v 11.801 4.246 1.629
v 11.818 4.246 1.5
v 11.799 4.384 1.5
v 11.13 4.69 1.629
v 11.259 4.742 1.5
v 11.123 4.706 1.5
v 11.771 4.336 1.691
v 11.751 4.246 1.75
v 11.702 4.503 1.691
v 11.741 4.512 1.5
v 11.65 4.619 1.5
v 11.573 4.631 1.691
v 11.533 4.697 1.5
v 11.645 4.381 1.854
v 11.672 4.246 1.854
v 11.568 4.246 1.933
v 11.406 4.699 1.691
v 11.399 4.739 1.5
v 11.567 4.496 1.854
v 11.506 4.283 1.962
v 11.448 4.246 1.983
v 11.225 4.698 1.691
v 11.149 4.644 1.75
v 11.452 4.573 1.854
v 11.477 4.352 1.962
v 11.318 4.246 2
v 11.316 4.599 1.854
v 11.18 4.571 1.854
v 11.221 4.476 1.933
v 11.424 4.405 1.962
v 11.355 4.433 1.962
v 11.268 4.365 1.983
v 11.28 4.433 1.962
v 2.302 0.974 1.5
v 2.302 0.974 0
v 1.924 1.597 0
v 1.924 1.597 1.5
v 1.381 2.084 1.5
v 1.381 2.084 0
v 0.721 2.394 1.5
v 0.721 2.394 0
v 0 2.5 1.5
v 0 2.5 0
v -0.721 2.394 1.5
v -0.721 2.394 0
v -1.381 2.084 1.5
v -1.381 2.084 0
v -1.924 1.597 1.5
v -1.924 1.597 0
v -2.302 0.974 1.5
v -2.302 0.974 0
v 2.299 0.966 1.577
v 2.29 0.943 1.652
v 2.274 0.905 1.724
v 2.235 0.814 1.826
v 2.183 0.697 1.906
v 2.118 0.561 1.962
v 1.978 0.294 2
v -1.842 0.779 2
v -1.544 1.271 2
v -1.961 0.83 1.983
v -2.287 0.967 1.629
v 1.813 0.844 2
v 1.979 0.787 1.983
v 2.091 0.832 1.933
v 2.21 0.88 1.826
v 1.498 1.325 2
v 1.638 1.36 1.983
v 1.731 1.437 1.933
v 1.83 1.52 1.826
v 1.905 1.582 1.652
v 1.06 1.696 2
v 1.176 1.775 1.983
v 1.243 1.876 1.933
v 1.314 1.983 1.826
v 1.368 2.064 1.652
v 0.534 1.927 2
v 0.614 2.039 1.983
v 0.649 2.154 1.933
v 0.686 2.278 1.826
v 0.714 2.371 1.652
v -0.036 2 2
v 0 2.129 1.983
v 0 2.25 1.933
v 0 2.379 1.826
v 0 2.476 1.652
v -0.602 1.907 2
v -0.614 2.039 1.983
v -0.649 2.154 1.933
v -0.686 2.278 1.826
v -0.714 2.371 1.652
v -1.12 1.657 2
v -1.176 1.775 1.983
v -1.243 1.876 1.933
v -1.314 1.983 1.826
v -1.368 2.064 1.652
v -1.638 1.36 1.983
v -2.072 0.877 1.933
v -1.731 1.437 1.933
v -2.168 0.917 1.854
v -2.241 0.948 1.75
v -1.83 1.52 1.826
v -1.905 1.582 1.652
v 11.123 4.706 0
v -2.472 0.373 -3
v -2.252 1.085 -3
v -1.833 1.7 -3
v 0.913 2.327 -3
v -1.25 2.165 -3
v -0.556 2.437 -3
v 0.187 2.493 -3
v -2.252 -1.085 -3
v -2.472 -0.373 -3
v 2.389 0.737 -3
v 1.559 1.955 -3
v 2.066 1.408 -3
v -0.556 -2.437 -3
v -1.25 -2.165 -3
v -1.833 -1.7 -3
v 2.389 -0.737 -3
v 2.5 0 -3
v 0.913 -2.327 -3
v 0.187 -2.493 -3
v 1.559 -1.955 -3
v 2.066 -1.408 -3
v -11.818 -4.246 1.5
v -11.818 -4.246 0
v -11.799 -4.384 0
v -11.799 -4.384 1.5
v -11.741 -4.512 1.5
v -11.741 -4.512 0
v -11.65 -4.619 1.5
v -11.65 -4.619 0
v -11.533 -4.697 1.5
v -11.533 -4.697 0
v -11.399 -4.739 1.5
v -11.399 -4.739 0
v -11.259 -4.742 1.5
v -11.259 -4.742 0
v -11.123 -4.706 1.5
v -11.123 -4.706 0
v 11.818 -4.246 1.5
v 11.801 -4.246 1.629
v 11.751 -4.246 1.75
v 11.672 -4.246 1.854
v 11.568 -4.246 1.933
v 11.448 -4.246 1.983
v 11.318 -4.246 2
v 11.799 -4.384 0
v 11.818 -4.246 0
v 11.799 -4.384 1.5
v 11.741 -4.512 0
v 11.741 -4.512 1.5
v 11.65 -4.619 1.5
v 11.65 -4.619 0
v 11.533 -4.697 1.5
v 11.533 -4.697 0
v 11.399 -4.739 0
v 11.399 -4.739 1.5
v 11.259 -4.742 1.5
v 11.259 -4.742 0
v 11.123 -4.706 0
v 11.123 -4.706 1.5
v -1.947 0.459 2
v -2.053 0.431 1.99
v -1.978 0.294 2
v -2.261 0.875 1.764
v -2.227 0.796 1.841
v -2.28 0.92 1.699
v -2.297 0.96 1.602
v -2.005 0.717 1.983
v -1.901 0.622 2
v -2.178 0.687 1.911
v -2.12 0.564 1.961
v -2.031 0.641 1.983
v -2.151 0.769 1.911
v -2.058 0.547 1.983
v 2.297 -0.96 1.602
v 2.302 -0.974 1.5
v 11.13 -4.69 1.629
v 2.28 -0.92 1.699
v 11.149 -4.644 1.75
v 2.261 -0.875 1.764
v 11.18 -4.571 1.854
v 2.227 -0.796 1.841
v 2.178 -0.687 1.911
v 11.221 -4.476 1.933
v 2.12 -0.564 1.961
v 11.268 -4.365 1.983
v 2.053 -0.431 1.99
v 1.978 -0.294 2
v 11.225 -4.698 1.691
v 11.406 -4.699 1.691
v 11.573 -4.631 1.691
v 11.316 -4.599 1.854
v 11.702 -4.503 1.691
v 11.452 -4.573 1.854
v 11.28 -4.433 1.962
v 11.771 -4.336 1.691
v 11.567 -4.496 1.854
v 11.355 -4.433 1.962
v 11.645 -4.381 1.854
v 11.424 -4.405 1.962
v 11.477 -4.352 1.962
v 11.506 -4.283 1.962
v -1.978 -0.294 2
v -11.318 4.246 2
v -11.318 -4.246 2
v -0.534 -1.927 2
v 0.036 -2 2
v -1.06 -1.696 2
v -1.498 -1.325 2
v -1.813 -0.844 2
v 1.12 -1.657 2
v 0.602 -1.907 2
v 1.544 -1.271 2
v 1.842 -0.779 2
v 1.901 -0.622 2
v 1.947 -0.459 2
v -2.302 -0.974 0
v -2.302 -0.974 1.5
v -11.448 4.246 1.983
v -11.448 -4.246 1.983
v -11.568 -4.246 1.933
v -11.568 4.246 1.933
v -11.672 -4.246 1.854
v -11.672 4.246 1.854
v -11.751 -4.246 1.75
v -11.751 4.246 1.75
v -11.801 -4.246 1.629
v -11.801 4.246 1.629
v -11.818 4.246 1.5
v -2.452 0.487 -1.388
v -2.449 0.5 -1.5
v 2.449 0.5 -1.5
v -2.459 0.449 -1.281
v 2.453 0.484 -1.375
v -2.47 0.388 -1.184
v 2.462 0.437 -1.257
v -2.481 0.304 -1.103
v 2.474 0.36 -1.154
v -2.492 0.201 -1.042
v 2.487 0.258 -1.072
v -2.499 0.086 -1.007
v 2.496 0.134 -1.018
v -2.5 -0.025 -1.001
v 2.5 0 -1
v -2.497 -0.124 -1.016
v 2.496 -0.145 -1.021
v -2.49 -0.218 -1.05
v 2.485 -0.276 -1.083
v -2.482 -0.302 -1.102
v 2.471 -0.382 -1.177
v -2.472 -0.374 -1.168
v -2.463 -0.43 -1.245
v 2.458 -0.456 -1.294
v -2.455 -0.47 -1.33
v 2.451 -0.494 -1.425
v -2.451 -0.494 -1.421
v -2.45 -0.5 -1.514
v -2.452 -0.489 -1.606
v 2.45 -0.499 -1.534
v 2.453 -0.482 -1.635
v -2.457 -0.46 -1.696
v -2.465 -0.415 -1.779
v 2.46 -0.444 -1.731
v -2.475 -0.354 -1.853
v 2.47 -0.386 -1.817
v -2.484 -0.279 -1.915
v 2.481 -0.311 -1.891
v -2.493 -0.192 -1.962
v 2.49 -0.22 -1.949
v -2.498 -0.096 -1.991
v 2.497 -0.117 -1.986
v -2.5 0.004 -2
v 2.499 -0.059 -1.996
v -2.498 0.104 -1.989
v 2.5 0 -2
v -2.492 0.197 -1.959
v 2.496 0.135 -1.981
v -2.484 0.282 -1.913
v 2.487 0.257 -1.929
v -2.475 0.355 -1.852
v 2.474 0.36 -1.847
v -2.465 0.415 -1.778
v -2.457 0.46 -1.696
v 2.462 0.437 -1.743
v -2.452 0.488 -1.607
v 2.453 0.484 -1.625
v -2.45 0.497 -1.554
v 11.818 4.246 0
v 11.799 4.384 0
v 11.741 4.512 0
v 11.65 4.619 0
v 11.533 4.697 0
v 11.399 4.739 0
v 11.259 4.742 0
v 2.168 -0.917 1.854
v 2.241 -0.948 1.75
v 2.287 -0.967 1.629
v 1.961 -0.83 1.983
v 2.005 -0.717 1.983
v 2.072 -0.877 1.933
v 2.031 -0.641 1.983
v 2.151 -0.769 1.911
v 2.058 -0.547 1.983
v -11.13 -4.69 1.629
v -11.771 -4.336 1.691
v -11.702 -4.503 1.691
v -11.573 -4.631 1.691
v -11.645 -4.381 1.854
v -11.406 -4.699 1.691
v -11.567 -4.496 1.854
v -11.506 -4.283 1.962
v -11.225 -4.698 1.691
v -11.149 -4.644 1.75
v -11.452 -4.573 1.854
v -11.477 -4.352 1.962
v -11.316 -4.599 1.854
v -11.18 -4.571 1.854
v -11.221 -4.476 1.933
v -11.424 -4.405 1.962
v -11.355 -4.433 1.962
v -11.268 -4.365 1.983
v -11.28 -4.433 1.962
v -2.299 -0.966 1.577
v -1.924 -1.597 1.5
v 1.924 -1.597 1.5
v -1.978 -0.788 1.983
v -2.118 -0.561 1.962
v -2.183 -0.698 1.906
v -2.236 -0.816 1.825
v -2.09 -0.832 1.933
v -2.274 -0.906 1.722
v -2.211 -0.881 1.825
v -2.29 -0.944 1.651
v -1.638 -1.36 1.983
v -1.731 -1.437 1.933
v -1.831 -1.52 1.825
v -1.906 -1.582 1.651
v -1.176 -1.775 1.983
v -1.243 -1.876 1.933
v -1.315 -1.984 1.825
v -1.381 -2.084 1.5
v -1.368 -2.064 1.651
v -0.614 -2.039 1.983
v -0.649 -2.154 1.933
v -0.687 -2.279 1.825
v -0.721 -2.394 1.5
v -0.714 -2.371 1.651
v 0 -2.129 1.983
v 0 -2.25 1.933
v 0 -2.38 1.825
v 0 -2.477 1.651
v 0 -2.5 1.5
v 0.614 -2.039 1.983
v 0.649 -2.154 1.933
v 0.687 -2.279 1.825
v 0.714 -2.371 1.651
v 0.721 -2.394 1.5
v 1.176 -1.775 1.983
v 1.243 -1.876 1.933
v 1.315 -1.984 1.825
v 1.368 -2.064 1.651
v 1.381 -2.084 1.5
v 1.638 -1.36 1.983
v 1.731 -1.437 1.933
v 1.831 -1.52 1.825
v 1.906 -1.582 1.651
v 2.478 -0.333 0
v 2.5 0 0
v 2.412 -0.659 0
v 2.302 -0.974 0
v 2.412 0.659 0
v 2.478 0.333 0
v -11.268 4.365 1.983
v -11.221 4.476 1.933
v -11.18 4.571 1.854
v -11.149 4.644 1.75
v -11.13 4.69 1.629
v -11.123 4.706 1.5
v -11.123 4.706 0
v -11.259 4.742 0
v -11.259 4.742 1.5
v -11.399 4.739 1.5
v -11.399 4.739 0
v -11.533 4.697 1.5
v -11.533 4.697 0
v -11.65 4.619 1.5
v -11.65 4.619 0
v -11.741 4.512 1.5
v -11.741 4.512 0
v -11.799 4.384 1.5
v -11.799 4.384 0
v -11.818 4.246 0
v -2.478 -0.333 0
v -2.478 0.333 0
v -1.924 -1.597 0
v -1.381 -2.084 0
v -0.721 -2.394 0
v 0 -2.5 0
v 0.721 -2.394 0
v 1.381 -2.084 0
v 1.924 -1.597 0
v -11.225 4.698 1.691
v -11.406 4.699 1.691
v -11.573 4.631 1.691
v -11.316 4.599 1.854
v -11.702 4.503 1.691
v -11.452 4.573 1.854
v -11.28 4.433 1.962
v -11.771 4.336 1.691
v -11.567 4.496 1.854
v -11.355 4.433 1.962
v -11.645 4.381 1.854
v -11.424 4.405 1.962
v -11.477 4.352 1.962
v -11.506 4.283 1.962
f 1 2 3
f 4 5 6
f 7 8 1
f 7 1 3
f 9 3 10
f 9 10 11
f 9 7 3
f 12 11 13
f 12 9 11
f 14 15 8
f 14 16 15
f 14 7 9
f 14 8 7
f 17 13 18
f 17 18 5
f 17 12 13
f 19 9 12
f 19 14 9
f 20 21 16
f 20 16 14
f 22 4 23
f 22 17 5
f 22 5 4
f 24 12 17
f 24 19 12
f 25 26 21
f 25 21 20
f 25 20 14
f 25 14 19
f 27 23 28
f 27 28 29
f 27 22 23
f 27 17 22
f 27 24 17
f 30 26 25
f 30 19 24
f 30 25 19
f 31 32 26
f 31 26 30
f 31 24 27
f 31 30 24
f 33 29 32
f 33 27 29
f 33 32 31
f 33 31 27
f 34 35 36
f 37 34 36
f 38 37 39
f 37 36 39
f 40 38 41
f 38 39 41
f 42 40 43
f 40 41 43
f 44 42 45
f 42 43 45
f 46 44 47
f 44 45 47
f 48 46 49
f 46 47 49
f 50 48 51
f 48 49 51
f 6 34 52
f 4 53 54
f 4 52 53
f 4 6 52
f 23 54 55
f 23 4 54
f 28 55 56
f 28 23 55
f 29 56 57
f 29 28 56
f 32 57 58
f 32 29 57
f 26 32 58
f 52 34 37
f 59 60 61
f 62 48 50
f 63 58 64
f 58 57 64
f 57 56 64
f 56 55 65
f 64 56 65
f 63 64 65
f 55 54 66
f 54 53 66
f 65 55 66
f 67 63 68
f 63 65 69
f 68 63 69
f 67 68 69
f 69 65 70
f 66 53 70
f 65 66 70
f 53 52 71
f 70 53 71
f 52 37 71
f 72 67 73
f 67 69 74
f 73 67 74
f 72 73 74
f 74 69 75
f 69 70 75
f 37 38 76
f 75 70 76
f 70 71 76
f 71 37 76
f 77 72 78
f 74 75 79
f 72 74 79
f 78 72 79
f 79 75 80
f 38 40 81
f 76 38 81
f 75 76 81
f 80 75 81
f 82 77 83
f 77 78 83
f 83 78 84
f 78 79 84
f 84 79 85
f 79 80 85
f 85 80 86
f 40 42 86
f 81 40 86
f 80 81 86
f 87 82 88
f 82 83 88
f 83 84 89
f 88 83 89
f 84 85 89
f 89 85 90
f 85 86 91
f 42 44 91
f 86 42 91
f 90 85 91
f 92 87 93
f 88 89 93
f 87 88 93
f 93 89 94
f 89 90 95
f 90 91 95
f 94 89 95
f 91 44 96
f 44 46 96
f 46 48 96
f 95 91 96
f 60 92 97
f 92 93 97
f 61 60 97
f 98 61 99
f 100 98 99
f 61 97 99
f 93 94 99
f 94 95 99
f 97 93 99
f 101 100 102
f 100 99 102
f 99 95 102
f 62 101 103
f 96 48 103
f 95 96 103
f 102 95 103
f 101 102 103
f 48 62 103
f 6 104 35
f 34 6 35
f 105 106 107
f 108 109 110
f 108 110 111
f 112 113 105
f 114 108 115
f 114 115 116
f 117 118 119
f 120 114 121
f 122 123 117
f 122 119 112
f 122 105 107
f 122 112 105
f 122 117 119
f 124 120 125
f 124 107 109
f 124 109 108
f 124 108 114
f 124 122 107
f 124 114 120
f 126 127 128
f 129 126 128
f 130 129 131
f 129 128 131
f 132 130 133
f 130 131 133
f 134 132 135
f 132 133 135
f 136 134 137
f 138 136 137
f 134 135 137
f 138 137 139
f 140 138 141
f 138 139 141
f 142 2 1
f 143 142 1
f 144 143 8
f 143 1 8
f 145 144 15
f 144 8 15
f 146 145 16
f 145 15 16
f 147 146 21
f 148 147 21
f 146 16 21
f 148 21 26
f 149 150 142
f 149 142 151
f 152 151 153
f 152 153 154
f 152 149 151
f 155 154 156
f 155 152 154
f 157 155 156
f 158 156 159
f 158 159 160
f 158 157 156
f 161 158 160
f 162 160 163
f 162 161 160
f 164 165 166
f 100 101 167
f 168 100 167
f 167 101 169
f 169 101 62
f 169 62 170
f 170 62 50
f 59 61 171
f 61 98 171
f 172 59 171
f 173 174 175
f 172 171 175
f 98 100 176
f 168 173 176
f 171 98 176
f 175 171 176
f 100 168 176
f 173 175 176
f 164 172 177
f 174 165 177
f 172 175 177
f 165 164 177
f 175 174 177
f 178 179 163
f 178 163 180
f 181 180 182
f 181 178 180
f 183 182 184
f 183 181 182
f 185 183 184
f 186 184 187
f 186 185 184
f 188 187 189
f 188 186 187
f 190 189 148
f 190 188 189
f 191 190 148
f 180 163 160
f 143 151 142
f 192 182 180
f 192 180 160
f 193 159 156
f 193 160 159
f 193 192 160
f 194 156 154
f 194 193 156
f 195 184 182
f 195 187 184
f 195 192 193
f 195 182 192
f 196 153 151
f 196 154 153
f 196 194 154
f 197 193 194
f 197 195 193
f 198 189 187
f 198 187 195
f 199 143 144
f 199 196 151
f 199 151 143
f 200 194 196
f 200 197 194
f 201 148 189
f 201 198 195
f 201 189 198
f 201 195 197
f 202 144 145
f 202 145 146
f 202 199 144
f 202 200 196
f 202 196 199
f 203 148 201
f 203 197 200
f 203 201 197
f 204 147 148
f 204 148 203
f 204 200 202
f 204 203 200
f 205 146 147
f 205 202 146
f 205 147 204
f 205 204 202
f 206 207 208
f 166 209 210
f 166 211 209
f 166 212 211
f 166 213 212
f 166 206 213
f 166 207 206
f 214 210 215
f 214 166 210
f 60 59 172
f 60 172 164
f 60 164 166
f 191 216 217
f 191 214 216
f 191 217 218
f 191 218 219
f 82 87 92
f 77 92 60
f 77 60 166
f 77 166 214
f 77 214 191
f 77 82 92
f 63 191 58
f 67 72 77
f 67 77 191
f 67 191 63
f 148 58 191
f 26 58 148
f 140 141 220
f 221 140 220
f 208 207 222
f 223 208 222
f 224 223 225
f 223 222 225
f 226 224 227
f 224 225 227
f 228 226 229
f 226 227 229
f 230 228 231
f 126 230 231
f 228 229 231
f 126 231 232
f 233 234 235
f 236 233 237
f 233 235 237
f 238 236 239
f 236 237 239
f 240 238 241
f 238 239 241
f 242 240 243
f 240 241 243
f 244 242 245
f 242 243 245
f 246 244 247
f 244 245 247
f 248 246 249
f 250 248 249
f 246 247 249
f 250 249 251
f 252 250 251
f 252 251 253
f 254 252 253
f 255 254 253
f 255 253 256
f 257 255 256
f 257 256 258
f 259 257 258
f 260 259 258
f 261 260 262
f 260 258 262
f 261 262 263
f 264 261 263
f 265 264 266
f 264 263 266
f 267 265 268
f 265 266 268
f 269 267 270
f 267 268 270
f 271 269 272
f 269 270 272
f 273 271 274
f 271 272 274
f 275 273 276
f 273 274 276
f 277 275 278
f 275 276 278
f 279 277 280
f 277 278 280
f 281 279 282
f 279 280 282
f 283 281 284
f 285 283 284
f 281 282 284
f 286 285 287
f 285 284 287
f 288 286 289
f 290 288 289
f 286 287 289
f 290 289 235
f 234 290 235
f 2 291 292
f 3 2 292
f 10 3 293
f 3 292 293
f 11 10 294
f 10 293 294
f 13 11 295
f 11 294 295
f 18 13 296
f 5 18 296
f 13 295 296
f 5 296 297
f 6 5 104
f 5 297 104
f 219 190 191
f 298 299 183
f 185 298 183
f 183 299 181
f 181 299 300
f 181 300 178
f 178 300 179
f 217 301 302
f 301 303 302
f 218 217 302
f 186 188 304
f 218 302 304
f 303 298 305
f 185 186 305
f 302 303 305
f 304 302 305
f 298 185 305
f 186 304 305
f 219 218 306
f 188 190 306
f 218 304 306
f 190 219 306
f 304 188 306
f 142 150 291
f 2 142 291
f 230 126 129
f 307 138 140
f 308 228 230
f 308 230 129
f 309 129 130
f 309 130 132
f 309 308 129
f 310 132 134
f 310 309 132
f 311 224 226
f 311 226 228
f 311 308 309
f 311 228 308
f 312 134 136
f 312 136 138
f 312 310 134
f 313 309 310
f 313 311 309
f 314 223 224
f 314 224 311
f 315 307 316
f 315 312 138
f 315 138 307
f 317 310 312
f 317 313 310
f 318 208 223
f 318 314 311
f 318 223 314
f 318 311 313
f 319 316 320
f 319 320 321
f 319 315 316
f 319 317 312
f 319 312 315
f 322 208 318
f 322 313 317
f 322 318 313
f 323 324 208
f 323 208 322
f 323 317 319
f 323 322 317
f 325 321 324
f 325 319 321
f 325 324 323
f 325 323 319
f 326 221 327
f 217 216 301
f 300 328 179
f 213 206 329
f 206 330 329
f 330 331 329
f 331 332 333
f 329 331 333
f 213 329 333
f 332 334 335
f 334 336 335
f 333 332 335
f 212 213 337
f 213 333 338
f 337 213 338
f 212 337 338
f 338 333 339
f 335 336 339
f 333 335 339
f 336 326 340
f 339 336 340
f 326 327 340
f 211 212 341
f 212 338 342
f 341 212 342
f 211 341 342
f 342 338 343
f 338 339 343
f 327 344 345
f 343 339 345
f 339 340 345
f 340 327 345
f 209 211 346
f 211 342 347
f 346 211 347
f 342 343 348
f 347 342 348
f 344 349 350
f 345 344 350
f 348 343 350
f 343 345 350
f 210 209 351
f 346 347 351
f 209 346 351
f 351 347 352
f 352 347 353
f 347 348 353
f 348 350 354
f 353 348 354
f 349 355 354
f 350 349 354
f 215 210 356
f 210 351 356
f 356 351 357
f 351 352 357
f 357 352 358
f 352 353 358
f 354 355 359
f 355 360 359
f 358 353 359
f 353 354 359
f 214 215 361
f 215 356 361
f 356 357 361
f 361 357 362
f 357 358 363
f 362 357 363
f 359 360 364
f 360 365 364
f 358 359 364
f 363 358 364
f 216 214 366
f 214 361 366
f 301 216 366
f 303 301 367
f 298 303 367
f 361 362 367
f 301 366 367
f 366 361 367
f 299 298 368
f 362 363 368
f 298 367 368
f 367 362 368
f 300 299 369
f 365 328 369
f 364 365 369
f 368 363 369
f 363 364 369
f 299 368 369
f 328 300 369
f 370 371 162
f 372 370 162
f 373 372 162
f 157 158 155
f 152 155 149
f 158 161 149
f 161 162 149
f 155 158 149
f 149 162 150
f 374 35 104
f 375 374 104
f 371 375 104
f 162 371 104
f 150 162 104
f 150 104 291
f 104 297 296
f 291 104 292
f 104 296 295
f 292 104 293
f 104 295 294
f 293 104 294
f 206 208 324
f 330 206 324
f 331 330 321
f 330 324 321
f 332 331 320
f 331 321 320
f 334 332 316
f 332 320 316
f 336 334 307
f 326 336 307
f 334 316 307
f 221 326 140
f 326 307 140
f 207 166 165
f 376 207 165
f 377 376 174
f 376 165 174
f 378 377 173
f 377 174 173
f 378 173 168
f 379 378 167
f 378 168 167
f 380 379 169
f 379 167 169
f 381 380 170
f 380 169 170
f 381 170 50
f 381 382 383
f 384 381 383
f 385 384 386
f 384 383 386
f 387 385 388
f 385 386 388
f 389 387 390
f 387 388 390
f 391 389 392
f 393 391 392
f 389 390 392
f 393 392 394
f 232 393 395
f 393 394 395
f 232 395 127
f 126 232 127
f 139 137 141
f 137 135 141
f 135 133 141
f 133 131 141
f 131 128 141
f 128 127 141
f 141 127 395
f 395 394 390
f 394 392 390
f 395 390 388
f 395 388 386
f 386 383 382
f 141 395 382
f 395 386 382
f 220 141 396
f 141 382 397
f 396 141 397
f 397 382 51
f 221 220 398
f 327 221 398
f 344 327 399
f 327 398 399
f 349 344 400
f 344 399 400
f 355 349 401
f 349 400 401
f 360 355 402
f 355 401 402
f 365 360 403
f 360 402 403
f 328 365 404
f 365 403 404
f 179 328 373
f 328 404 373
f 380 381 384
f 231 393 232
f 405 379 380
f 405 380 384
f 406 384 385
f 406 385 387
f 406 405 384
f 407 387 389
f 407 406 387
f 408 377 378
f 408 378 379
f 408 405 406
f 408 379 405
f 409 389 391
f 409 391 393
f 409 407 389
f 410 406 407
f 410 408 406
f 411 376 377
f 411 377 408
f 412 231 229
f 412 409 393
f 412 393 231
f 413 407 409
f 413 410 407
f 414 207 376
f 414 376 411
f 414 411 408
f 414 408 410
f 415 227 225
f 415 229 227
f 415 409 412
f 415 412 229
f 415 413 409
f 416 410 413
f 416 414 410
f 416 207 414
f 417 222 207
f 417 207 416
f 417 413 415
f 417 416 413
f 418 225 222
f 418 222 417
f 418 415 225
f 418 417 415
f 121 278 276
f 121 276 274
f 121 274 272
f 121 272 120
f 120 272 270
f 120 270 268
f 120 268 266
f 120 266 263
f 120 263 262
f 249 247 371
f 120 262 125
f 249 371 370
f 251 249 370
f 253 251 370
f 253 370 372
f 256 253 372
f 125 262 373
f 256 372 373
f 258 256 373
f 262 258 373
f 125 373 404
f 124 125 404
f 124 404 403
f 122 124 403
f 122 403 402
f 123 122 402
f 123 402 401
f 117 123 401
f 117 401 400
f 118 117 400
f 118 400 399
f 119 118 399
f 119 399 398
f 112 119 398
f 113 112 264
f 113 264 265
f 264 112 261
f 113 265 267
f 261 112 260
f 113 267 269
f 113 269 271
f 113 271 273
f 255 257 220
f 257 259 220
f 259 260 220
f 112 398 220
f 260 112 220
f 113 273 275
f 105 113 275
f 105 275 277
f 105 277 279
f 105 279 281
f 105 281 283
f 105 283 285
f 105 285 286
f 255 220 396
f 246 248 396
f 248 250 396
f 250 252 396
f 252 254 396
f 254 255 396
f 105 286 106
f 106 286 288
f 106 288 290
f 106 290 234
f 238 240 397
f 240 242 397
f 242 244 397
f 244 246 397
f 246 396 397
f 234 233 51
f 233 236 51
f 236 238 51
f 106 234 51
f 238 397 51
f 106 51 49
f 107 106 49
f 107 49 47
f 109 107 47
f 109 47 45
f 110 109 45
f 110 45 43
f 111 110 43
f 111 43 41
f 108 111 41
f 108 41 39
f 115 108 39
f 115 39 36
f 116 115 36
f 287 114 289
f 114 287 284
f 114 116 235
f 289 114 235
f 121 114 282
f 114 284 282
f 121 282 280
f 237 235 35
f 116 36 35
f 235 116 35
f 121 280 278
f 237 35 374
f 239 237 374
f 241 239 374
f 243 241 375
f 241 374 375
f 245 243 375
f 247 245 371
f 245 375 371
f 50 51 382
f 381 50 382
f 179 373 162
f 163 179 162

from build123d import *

# Parameters (mm, degrees)
F1_DEPTH      = 2
F2_R          = 2.5
F3_DEPTH      = 3
F4_R          = 0.5
F5_DEPTH      = 12.5
F6_T1_DEPTH   = 3.3861126193
F6_T3_DEPTH   = 8.4911099046
F6_T8_DEPTH   = 0.5
F6_T14_DEPTH  = 0.5
F6_T20_DEPTH  = 0.5
F6_T26_DEPTH  = 0.5
F6_T32_DEPTH  = 10.8279460436
F6_S33_R      = 2.5
F6_T34_DEPTH  = 7
F6_T36_ANGLE  = 134.1359227244
F6_T40_DEPTH  = 10.8279460436
F6_S41_R      = 2.5
F6_T42_DEPTH  = 7
F6_T46_DEPTH  = 10.8279460436
F6_S47_R      = 2.5
F6_T48_DEPTH  = 7
F6_T50_ANGLE  = 134.1359227244
F6_T54_DEPTH  = 10.8279460436
F6_S55_R      = 2.5
F6_T56_DEPTH  = 7
F6_T61_DEPTH  = 10.8279460436
F6_S62_R      = 2.5
F6_T63_DEPTH  = 7
F6_T66_ANGLE  = 162.8093840648
F6_T73_ANGLE  = 162.8093840648
F6_T77_DEPTH  = 10.8279460436
F6_S78_R      = 2.5
F6_T79_DEPTH  = 7
F6_T85_DEPTH  = 10.8279460436
F6_S86_R      = 2.5
F6_T87_DEPTH  = 7
F6_T90_ANGLE  = 162.8093840648
F6_T97_DEPTH  = 10.8279460436
F6_S98_R      = 2.5
F6_T99_DEPTH  = 7
F6_T102_ANGLE = 162.8093840648


# Not quite as in the source:
# - a fillet or chamfer that OpenCascade refuses, or shapes differently, is made with other operations: its cross-section is extruded or revolved along the edge and cut away or added


with BuildPart() as f1:
    # F0 (on Top) → F1 (new body)
    with BuildSketch(Plane.XY):
        with BuildLine():
            ThreePointArc((2.3024191783, -0.9740974937), (2.4501069309, -0.4969668269), (2.5, 0))
            ThreePointArc((2.5, 0), (2.4501069309, 0.4969668269), (2.3024191783, 0.9740974937))
            Line((2.3024191783, 0.9740974937), (0, 0))
            Line((0, 0), (2.3024191783, -0.9740974937))
        make_face()
        with BuildLine():
            ThreePointArc((2.3024191783, 0.9740974937), (2.4501069309, 0.4969668269), (2.5, 0))
            ThreePointArc((2.5, 0), (2.4501069309, -0.4969668269), (2.3024191783, -0.9740974937))
            Line((2.3024191783, -0.9740974937), (11.8182173411, -5))
            Line((11.8182173411, -5), (11.8182173411, 5))
            Line((11.8182173411, 5), (2.3024191783, 0.9740974937))
        make_face()
        with BuildLine():
            Line((0, 0), (2.3024191783, 0.9740974937))
            ThreePointArc((2.3024191783, 0.9740974937), (0, 2.5), (-2.3024191783, 0.9740974937))
            Line((-2.3024191783, 0.9740974937), (0, 0))
        make_face()
        with BuildLine():
            ThreePointArc((-2.3024191783, -0.9740974937), (0, -2.5), (2.3024191783, -0.9740974937))
            Line((2.3024191783, -0.9740974937), (0, 0))
            Line((0, 0), (-2.3024191783, -0.9740974937))
        make_face()
        with BuildLine():
            Line((0, 0), (-2.3024191783, 0.9740974937))
            ThreePointArc((-2.3024191783, 0.9740974937), (-2.5, 0), (-2.3024191783, -0.9740974937))
            Line((-2.3024191783, -0.9740974937), (0, 0))
        make_face()
        with BuildLine():
            ThreePointArc((-2.3024191783, -0.9740974937), (-2.5, 0), (-2.3024191783, 0.9740974937))
            Line((-2.3024191783, 0.9740974937), (-11.8182173411, 5))
            Line((-11.8182173411, 5), (-11.8182173411, -5))
            Line((-11.8182173411, -5), (-2.3024191783, -0.9740974937))
        make_face()
    extrude(amount=F1_DEPTH)

    # F2 (on face) → F3 (join)
    with BuildSketch(Plane(origin=(0, 0, 0), x_dir=(1, 0, 0), z_dir=(0, 0, -1))):
        Circle(F2_R)
    extrude(amount=F3_DEPTH)

    # F4 (on Right) → F5 (cut, symmetric)
    with BuildSketch(Plane.YZ):
        with Locations((0, -1.5)):
            Circle(F4_R)
    extrude(amount=F5_DEPTH, both=True, mode=Mode.SUBTRACT)

    # F6: fillet of radius 0.5 on 12 edges, made by hand

    # F6_s2 → F6_t1 (cut)
    with BuildSketch(Plane.XY.offset(-1.8861126193)):
        with BuildLine():
            ThreePointArc((-11.8182173411, -4.2455549523), (-11.5944330635, -4.6623341201), (-11.1233978424, -4.706038788))
            Line((-11.1233978424, -4.706038788), (-11.8182173411, -5))
            Line((-11.8182173411, -5), (-11.8182173411, -4.2455549523))
        make_face()
        with BuildLine():
            ThreePointArc((11.8182173411, 4.2455549523), (11.5944330635, 4.6623341201), (11.1233978424, 4.706038788))
            Line((11.1233978424, 4.706038788), (11.8182173411, 5))
            Line((11.8182173411, 5), (11.8182173411, 4.2455549523))
        make_face()
        with BuildLine():
            ThreePointArc((11.8182173411, -4.2455549523), (11.5944330635, -4.6623341201), (11.1233978424, -4.706038788))
            Line((11.1233978424, -4.706038788), (11.8182173411, -5))
            Line((11.8182173411, -5), (11.8182173411, -4.2455549523))
        make_face()
        with BuildLine():
            ThreePointArc((-11.1233978424, 4.706038788), (-11.5944330635, 4.6623341201), (-11.8182173411, 4.2455549523))
            Line((-11.8182173411, 4.2455549523), (-11.8182173411, 5))
            Line((-11.8182173411, 5), (-11.1233978424, 4.706038788))
        make_face()
    extrude(amount=F6_T1_DEPTH, mode=Mode.SUBTRACT)

    # F6_s4 → F6_t3 (cut)
    with BuildSketch(Plane.XZ.offset(-4.2455549523)):
        with BuildLine():
            ThreePointArc((11.8182173411, 1.5), (11.6717707317, 1.8535533906), (11.3182173411, 2))
            Line((11.3182173411, 2), (11.8182173411, 2))
            Line((11.8182173411, 2), (11.8182173411, 1.5))
        make_face()
        with BuildLine():
            ThreePointArc((-11.3182173411, 2), (-11.6717707317, 1.8535533906), (-11.8182173411, 1.5))
            Line((-11.8182173411, 1.5), (-11.8182173411, 2))
            Line((-11.8182173411, 2), (-11.3182173411, 2))
        make_face()
    extrude(amount=F6_T3_DEPTH, mode=Mode.SUBTRACT)


with BuildPart() as f6_tool6:
    # F6_s7 → F6_t8 (new body)
    with BuildSketch(Plane.XY.offset(1.5)):
        Polygon((-11.3182173411, -4.2455549523), (-11.8182173411, -4.2455549523), (-11.8182173411, -5), (-11.1233978424, -4.706038788), align=None)
    extrude(amount=F6_T8_DEPTH)

    # F6_s9 → F6_t10 (revolve, cut)
    with BuildSketch(Plane(origin=(-11.3182173411, -4.2455549523, 1.5), x_dir=(0.5524314449, 0.8335583355, 0), z_dir=(0.8335583355, -0.5524314449, 0))):
        with BuildLine():
            ThreePointArc((0, -0.5), (0.5, 0), (0, 0.5))
            Line((0, 0.5), (0, -0.5))
        make_face()
    revolve(axis=Axis((-11.3182173411, -4.2455549523, 1.5), (0, 0, 1)), mode=Mode.SUBTRACT)


with BuildPart() as f1_1:
    add(f1.part)

    # F6_t5: cut F6_tool6
    add(f6_tool6.part, mode=Mode.SUBTRACT)


with BuildPart() as f6_tool12:
    # F6_s13 → F6_t14 (new body)
    with BuildSketch(Plane.XY.offset(1.5)):
        Polygon((11.3182173411, 4.2455549523), (11.8182173411, 4.2455549523), (11.8182173411, 5), (11.1233978424, 4.706038788), align=None)
    extrude(amount=F6_T14_DEPTH)

    # F6_s15 → F6_t16 (revolve, cut)
    with BuildSketch(Plane(origin=(11.3182173411, 4.2455549523, 1.5), x_dir=(-0.5524314449, -0.8335583355, 0), z_dir=(-0.8335583355, 0.5524314449, 0))):
        with BuildLine():
            ThreePointArc((0, -0.5), (0.5, 0), (0, 0.5))
            Line((0, 0.5), (0, -0.5))
        make_face()
    revolve(axis=Axis((11.3182173411, 4.2455549523, 1.5), (0, 0, 1)), mode=Mode.SUBTRACT)


with BuildPart() as f1_2:
    add(f1_1.part)

    # F6_t11: cut F6_tool12
    add(f6_tool12.part, mode=Mode.SUBTRACT)


with BuildPart() as f6_tool18:
    # F6_s19 → F6_t20 (new body)
    with BuildSketch(Plane.XY.offset(1.5)):
        Polygon((11.3182173411, -4.2455549523), (11.8182173411, -4.2455549523), (11.8182173411, -5), (11.1233978424, -4.706038788), align=None)
    extrude(amount=F6_T20_DEPTH)

    # F6_s21 → F6_t22 (revolve, cut)
    with BuildSketch(Plane(origin=(11.3182173411, -4.2455549523, 1.5), x_dir=(-0.5524314449, 0.8335583355, 0), z_dir=(0.8335583355, 0.5524314449, 0))):
        with BuildLine():
            ThreePointArc((0, -0.5), (0.5, 0), (0, 0.5))
            Line((0, 0.5), (0, -0.5))
        make_face()
    revolve(axis=Axis((11.3182173411, -4.2455549523, 1.5), (0, 0, 1)), mode=Mode.SUBTRACT)


with BuildPart() as f1_3:
    add(f1_2.part)

    # F6_t17: cut F6_tool18
    add(f6_tool18.part, mode=Mode.SUBTRACT)


with BuildPart() as f6_tool24:
    # F6_s25 → F6_t26 (new body)
    with BuildSketch(Plane.XY.offset(1.5)):
        Polygon((-11.3182173411, 4.2455549523), (-11.1233978424, 4.706038788), (-11.8182173411, 5), (-11.8182173411, 4.2455549523), align=None)
    extrude(amount=F6_T26_DEPTH)

    # F6_s27 → F6_t28 (revolve, cut)
    with BuildSketch(Plane(origin=(-11.3182173411, 4.2455549523, 1.5), x_dir=(0.5524314449, -0.8335583355, 0), z_dir=(-0.8335583355, -0.5524314449, 0))):
        with BuildLine():
            ThreePointArc((0, -0.5), (0.5, 0), (0, 0.5))
            Line((0, 0.5), (0, -0.5))
        make_face()
    revolve(axis=Axis((-11.3182173411, 4.2455549523, 1.5), (0, 0, 1)), mode=Mode.SUBTRACT)


with BuildPart() as f1_4:
    add(f1_3.part)

    # F6_t23: cut F6_tool24
    add(f6_tool24.part, mode=Mode.SUBTRACT)


with BuildPart() as f6_tool30:
    # F6_s31 → F6_t32 (new body)
    with BuildSketch(Plane(origin=(11.1233978424, 4.706038788, 0), x_dir=(0, 0, 1), z_dir=(-0.9209676713, -0.3896389975, 0))):
        with BuildLine():
            ThreePointArc((1.5, 0), (1.8535533906, -0.1464466094), (2, -0.5))
            Line((2, -0.5), (2, 0))
            Line((2, 0), (1.5, 0))
        make_face()
    extrude(amount=F6_T32_DEPTH)

    # F6_s33 → F6_t34 (cut, symmetric)
    with BuildSketch(Plane.XY.offset(1.8)):
        Circle(F6_S33_R)
    extrude(amount=F6_T34_DEPTH, both=True, mode=Mode.SUBTRACT)


with BuildPart() as f1_5:
    add(f1_4.part)

    # F6_t29: cut F6_tool30
    add(f6_tool30.part, mode=Mode.SUBTRACT)

    # F6_s35 → F6_t36 (revolve, cut)
    with BuildSketch(Plane(origin=(0, 0, 0), x_dir=(0, 0, 1), z_dir=(0.3896389975, -0.9209676713, 0))):
        with BuildLine():
            ThreePointArc((2, -2), (1.8535533906, -2.3535533906), (1.5, -2.5))
            Line((1.5, -2.5), (2, -2.5))
            Line((2, -2.5), (2, -2))
        make_face()
    revolve(axis=Axis((0, 0, 2), (0, 0, 1)), revolution_arc=F6_T36_ANGLE, mode=Mode.SUBTRACT)


with BuildPart() as f6_tool38:
    # F6_s39 → F6_t40 (new body)
    with BuildSketch(Plane(origin=(-1.1512095892, 0.4870487468, 0), x_dir=(0, 0, 1), z_dir=(-0.9209676713, 0.3896389975, 0))):
        with BuildLine():
            ThreePointArc((2, -0.5), (1.8535533906, -0.1464466094), (1.5, 0))
            Line((1.5, 0), (2, 0))
            Line((2, 0), (2, -0.5))
        make_face()
    extrude(amount=F6_T40_DEPTH)

    # F6_s41 → F6_t42 (cut, symmetric)
    with BuildSketch(Plane.XY.offset(1.8)):
        Circle(F6_S41_R)
    extrude(amount=F6_T42_DEPTH, both=True, mode=Mode.SUBTRACT)


with BuildPart() as f1_6:
    add(f1_5.part)

    # F6_t37: cut F6_tool38
    add(f6_tool38.part, mode=Mode.SUBTRACT)


with BuildPart() as f6_tool44:
    # F6_s45 → F6_t46 (new body)
    with BuildSketch(Plane(origin=(-11.1233978424, -4.706038788, 0), x_dir=(0, 0, 1), z_dir=(0.9209676713, 0.3896389975, 0))):
        with BuildLine():
            ThreePointArc((2, -0.5), (1.8535533906, -0.1464466094), (1.5, 0))
            Line((1.5, 0), (2, 0))
            Line((2, 0), (2, -0.5))
        make_face()
    extrude(amount=F6_T46_DEPTH)

    # F6_s47 → F6_t48 (cut, symmetric)
    with BuildSketch(Plane.XY.offset(1.7)):
        Circle(F6_S47_R)
    extrude(amount=F6_T48_DEPTH, both=True, mode=Mode.SUBTRACT)


with BuildPart() as f1_7:
    add(f1_6.part)

    # F6_t43: cut F6_tool44
    add(f6_tool44.part, mode=Mode.SUBTRACT)

    # F6_s49 → F6_t50 (revolve, cut)
    with BuildSketch(Plane(origin=(0, 0, 0), x_dir=(0, 0, 1), z_dir=(-0.3896389975, 0.9209676713, 0))):
        with BuildLine():
            ThreePointArc((2, -2), (1.8535533906, -2.3535533906), (1.5, -2.5))
            Line((1.5, -2.5), (2, -2.5))
            Line((2, -2.5), (2, -2))
        make_face()
    revolve(axis=Axis((0, 0, 2), (0, 0, 1)), revolution_arc=F6_T50_ANGLE, mode=Mode.SUBTRACT)


with BuildPart() as f6_tool52:
    # F6_s53 → F6_t54 (new body)
    with BuildSketch(Plane(origin=(1.1512095892, -0.4870487468, 0), x_dir=(0, 0, 1), z_dir=(0.9209676713, -0.3896389975, 0))):
        with BuildLine():
            ThreePointArc((1.5, 0), (1.8535533906, -0.1464466094), (2, -0.5))
            Line((2, -0.5), (2, 0))
            Line((2, 0), (1.5, 0))
        make_face()
    extrude(amount=F6_T54_DEPTH)

    # F6_s55 → F6_t56 (cut, symmetric)
    with BuildSketch(Plane.XY.offset(1.8)):
        Circle(F6_S55_R)
    extrude(amount=F6_T56_DEPTH, both=True, mode=Mode.SUBTRACT)


with BuildPart() as f1_8:
    add(f1_7.part)

    # F6_t51: cut F6_tool52
    add(f6_tool52.part, mode=Mode.SUBTRACT)


with BuildPart() as f6_tool59:
    # F6_s60 → F6_t61 (new body)
    with BuildSketch(Plane(origin=(11.1233978424, 4.706038788, 0), x_dir=(0, 0, 1), z_dir=(-0.9209676713, -0.3896389975, 0))):
        with BuildLine():
            ThreePointArc((1.5, 0), (1.8535533906, -0.1464466094), (2, -0.5))
            Line((2, -0.5), (2, 0))
            Line((2, 0), (1.5, 0))
        make_face()
    extrude(amount=F6_T61_DEPTH)

    # F6_s62 → F6_t63 (intersect, symmetric)
    with BuildSketch(Plane.XY.offset(1.8)):
        Circle(F6_S62_R)
    extrude(amount=F6_T63_DEPTH, both=True, mode=Mode.INTERSECT)


with BuildPart() as f6_tool64:
    # F6_s65 → F6_t66 (revolve)
    with BuildSketch(Plane(origin=(0, 0, 0), x_dir=(0, 0, 1), z_dir=(-0.1000391116, -0.9949835055, 0))):
        with BuildLine():
            ThreePointArc((2, -2), (1.8535533906, -2.3535533906), (1.5, -2.5))
            Line((1.5, -2.5), (2, -2.5))
            Line((2, -2.5), (2, -2))
        make_face()
    revolve(axis=Axis((0, 0, 2), (0, 0, 1)), revolution_arc=F6_T66_ANGLE)

    split(bisect_by=Plane(origin=(0, 0, 0), x_dir=(0, 0, 1), z_dir=(0.3896389975, -0.9209676713, 0)), keep=Keep.TOP)


with BuildPart() as f6_tool59_1:
    add(f6_tool59.part)

    # F6_t68: intersect F6_tool64
    add(f6_tool64.part, mode=Mode.INTERSECT)


with BuildPart() as f1_9:
    add(f1_8.part)

    # F6_t57: cut F6_tool59
    add(f6_tool59_1.part, mode=Mode.SUBTRACT)


with BuildPart() as f6_tool71:
    # F6_s72 → F6_t73 (revolve)
    with BuildSketch(Plane(origin=(0, 0, 0), x_dir=(0, 0, 1), z_dir=(0.3896389975, -0.9209676713, 0))):
        with BuildLine():
            ThreePointArc((2, -2), (1.8535533906, -2.3535533906), (1.5, -2.5))
            Line((1.5, -2.5), (2, -2.5))
            Line((2, -2.5), (2, -2))
        make_face()
    revolve(axis=Axis((0, 0, 2), (0, 0, 1)), revolution_arc=F6_T73_ANGLE)

    split(bisect_by=Plane(origin=(0, 0, 0), x_dir=(0, 0, 1), z_dir=(-0.3896389975, -0.9209676713, 0)), keep=Keep.TOP)


with BuildPart() as f6_tool75:
    # F6_s76 → F6_t77 (new body)
    with BuildSketch(Plane(origin=(-1.1512095892, 0.4870487468, 0), x_dir=(0, 0, 1), z_dir=(-0.9209676713, 0.3896389975, 0))):
        with BuildLine():
            ThreePointArc((2, -0.5), (1.8535533906, -0.1464466094), (1.5, 0))
            Line((1.5, 0), (2, 0))
            Line((2, 0), (2, -0.5))
        make_face()
    extrude(amount=F6_T77_DEPTH)

    # F6_s78 → F6_t79 (intersect, symmetric)
    with BuildSketch(Plane.XY.offset(1.8)):
        Circle(F6_S78_R)
    extrude(amount=F6_T79_DEPTH, both=True, mode=Mode.INTERSECT)


with BuildPart() as f6_tool71_1:
    add(f6_tool71.part)

    # F6_t80: intersect F6_tool75
    add(f6_tool75.part, mode=Mode.INTERSECT)


with BuildPart() as f1_10:
    add(f1_9.part)

    # F6_t69: cut F6_tool71
    add(f6_tool71_1.part, mode=Mode.SUBTRACT)


with BuildPart() as f6_tool83:
    # F6_s84 → F6_t85 (new body)
    with BuildSketch(Plane(origin=(-11.1233978424, -4.706038788, 0), x_dir=(0, 0, 1), z_dir=(0.9209676713, 0.3896389975, 0))):
        with BuildLine():
            ThreePointArc((2, -0.5), (1.8535533906, -0.1464466094), (1.5, 0))
            Line((1.5, 0), (2, 0))
            Line((2, 0), (2, -0.5))
        make_face()
    extrude(amount=F6_T85_DEPTH)

    # F6_s86 → F6_t87 (intersect, symmetric)
    with BuildSketch(Plane.XY.offset(1.7)):
        Circle(F6_S86_R)
    extrude(amount=F6_T87_DEPTH, both=True, mode=Mode.INTERSECT)


with BuildPart() as f6_tool88:
    # F6_s89 → F6_t90 (revolve)
    with BuildSketch(Plane(origin=(0, 0, 0), x_dir=(0, 0, 1), z_dir=(0.1000391116, 0.9949835055, 0))):
        with BuildLine():
            ThreePointArc((2, -2), (1.8535533906, -2.3535533906), (1.5, -2.5))
            Line((1.5, -2.5), (2, -2.5))
            Line((2, -2.5), (2, -2))
        make_face()
    revolve(axis=Axis((0, 0, 2), (0, 0, 1)), revolution_arc=F6_T90_ANGLE)

    split(bisect_by=Plane(origin=(0, 0, 0), x_dir=(0, 0, 1), z_dir=(-0.3896389975, 0.9209676713, 0)), keep=Keep.TOP)


with BuildPart() as f6_tool83_1:
    add(f6_tool83.part)

    # F6_t92: intersect F6_tool88
    add(f6_tool88.part, mode=Mode.INTERSECT)


with BuildPart() as f1_11:
    add(f1_10.part)

    # F6_t81: cut F6_tool83
    add(f6_tool83_1.part, mode=Mode.SUBTRACT)


with BuildPart() as f6_tool95:
    # F6_s96 → F6_t97 (new body)
    with BuildSketch(Plane(origin=(1.1512095892, -0.4870487468, 0), x_dir=(0, 0, 1), z_dir=(0.9209676713, -0.3896389975, 0))):
        with BuildLine():
            ThreePointArc((1.5, 0), (1.8535533906, -0.1464466094), (2, -0.5))
            Line((2, -0.5), (2, 0))
            Line((2, 0), (1.5, 0))
        make_face()
    extrude(amount=F6_T97_DEPTH)

    # F6_s98 → F6_t99 (intersect, symmetric)
    with BuildSketch(Plane.XY.offset(1.8)):
        Circle(F6_S98_R)
    extrude(amount=F6_T99_DEPTH, both=True, mode=Mode.INTERSECT)


with BuildPart() as f6_tool100:
    # F6_s101 → F6_t102 (revolve)
    with BuildSketch(Plane(origin=(0, 0, 0), x_dir=(0, 0, 1), z_dir=(-0.3896389975, 0.9209676713, 0))):
        with BuildLine():
            ThreePointArc((2, -2), (1.8535533906, -2.3535533906), (1.5, -2.5))
            Line((1.5, -2.5), (2, -2.5))
            Line((2, -2.5), (2, -2))
        make_face()
    revolve(axis=Axis((0, 0, 2), (0, 0, 1)), revolution_arc=F6_T102_ANGLE)

    split(bisect_by=Plane(origin=(0, 0, 0), x_dir=(0, 0, 1), z_dir=(0.3896389975, 0.9209676713, 0)), keep=Keep.TOP)


with BuildPart() as f6_tool95_1:
    add(f6_tool95.part)

    # F6_t104: intersect F6_tool100
    add(f6_tool100.part, mode=Mode.INTERSECT)


with BuildPart() as f1_12:
    add(f1_11.part)

    # F6_t93: cut F6_tool95
    add(f6_tool95_1.part, mode=Mode.SUBTRACT)


solid = f1_12.part
